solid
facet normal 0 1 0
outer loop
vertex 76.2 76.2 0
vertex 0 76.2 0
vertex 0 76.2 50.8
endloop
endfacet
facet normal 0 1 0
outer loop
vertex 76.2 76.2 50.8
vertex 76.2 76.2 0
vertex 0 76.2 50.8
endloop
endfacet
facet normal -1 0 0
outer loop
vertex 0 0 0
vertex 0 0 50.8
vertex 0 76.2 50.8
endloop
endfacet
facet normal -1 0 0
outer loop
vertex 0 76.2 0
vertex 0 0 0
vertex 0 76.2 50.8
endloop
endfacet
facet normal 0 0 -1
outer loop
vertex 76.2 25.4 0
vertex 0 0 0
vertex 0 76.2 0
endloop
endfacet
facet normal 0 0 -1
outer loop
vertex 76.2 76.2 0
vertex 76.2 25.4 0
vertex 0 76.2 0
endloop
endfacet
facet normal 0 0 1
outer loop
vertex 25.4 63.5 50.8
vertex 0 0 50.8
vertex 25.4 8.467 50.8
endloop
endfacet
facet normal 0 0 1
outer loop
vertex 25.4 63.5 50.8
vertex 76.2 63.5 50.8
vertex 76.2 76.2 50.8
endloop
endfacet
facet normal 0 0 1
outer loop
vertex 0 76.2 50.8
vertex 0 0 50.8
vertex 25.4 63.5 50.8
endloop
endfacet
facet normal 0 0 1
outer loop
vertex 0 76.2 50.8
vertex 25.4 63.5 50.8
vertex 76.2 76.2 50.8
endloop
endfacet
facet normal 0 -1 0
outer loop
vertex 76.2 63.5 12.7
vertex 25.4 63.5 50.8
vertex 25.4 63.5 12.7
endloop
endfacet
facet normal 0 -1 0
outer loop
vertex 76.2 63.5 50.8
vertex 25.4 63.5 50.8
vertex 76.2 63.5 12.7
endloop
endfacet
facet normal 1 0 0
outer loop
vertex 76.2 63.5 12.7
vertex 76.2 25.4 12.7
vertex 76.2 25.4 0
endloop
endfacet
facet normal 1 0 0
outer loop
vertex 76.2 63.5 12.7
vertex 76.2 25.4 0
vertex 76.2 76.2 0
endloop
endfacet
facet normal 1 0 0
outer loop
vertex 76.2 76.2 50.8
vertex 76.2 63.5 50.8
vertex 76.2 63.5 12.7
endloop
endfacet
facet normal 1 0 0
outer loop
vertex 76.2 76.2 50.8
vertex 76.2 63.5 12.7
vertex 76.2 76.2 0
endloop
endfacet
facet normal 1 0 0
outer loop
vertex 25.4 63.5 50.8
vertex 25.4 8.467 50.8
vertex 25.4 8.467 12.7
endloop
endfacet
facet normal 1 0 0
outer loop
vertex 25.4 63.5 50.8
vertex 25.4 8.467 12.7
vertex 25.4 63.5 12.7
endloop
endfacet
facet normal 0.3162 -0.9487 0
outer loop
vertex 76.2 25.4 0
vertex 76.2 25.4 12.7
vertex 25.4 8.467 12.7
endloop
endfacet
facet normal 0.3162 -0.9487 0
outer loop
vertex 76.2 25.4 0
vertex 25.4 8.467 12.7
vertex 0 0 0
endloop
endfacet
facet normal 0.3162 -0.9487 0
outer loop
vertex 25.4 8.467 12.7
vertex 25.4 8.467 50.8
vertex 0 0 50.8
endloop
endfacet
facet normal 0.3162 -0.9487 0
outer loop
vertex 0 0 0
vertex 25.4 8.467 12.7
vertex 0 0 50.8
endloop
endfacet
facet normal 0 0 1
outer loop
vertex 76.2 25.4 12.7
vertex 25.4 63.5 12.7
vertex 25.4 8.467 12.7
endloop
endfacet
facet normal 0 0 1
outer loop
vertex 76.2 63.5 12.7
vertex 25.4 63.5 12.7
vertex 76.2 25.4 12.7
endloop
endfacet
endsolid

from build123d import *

# Parameters (mm, degrees)
F0_W     = 76.2
F0_H     = 50.8
F1_DEPTH = 76.2
F2_W     = 50.8
F2_H     = 63.5
F3_DEPTH = 38.1
F5_DEPTH = 50.801


with BuildPart() as f1:
    # F0 (on Right) → F1 (new body)
    with BuildSketch(Plane.YZ):
        with Locations((38.1, 25.4)):
            Rectangle(F0_W, F0_H)
    extrude(amount=F1_DEPTH)

    # F2 (on face) → F3 (cut)
    with BuildSketch(Plane.XY.offset(50.8)):
        with Locations((50.8, 31.75)):
            Rectangle(F2_W, F2_H)
    extrude(amount=-F3_DEPTH, mode=Mode.SUBTRACT)

    # F4 (on face) → F5 (cut, through all)
    with BuildSketch(Plane.XY.offset(50.8)):
        Polygon((76.2, 25.4), (0, 0), (76.2, 0), align=None)
        Polygon((25.4, 8.466667), (25.4, 0), (76.2, 0), (76.2, 25.4), align=None)
    extrude(amount=-F5_DEPTH, mode=Mode.SUBTRACT)


solid = f1.part
